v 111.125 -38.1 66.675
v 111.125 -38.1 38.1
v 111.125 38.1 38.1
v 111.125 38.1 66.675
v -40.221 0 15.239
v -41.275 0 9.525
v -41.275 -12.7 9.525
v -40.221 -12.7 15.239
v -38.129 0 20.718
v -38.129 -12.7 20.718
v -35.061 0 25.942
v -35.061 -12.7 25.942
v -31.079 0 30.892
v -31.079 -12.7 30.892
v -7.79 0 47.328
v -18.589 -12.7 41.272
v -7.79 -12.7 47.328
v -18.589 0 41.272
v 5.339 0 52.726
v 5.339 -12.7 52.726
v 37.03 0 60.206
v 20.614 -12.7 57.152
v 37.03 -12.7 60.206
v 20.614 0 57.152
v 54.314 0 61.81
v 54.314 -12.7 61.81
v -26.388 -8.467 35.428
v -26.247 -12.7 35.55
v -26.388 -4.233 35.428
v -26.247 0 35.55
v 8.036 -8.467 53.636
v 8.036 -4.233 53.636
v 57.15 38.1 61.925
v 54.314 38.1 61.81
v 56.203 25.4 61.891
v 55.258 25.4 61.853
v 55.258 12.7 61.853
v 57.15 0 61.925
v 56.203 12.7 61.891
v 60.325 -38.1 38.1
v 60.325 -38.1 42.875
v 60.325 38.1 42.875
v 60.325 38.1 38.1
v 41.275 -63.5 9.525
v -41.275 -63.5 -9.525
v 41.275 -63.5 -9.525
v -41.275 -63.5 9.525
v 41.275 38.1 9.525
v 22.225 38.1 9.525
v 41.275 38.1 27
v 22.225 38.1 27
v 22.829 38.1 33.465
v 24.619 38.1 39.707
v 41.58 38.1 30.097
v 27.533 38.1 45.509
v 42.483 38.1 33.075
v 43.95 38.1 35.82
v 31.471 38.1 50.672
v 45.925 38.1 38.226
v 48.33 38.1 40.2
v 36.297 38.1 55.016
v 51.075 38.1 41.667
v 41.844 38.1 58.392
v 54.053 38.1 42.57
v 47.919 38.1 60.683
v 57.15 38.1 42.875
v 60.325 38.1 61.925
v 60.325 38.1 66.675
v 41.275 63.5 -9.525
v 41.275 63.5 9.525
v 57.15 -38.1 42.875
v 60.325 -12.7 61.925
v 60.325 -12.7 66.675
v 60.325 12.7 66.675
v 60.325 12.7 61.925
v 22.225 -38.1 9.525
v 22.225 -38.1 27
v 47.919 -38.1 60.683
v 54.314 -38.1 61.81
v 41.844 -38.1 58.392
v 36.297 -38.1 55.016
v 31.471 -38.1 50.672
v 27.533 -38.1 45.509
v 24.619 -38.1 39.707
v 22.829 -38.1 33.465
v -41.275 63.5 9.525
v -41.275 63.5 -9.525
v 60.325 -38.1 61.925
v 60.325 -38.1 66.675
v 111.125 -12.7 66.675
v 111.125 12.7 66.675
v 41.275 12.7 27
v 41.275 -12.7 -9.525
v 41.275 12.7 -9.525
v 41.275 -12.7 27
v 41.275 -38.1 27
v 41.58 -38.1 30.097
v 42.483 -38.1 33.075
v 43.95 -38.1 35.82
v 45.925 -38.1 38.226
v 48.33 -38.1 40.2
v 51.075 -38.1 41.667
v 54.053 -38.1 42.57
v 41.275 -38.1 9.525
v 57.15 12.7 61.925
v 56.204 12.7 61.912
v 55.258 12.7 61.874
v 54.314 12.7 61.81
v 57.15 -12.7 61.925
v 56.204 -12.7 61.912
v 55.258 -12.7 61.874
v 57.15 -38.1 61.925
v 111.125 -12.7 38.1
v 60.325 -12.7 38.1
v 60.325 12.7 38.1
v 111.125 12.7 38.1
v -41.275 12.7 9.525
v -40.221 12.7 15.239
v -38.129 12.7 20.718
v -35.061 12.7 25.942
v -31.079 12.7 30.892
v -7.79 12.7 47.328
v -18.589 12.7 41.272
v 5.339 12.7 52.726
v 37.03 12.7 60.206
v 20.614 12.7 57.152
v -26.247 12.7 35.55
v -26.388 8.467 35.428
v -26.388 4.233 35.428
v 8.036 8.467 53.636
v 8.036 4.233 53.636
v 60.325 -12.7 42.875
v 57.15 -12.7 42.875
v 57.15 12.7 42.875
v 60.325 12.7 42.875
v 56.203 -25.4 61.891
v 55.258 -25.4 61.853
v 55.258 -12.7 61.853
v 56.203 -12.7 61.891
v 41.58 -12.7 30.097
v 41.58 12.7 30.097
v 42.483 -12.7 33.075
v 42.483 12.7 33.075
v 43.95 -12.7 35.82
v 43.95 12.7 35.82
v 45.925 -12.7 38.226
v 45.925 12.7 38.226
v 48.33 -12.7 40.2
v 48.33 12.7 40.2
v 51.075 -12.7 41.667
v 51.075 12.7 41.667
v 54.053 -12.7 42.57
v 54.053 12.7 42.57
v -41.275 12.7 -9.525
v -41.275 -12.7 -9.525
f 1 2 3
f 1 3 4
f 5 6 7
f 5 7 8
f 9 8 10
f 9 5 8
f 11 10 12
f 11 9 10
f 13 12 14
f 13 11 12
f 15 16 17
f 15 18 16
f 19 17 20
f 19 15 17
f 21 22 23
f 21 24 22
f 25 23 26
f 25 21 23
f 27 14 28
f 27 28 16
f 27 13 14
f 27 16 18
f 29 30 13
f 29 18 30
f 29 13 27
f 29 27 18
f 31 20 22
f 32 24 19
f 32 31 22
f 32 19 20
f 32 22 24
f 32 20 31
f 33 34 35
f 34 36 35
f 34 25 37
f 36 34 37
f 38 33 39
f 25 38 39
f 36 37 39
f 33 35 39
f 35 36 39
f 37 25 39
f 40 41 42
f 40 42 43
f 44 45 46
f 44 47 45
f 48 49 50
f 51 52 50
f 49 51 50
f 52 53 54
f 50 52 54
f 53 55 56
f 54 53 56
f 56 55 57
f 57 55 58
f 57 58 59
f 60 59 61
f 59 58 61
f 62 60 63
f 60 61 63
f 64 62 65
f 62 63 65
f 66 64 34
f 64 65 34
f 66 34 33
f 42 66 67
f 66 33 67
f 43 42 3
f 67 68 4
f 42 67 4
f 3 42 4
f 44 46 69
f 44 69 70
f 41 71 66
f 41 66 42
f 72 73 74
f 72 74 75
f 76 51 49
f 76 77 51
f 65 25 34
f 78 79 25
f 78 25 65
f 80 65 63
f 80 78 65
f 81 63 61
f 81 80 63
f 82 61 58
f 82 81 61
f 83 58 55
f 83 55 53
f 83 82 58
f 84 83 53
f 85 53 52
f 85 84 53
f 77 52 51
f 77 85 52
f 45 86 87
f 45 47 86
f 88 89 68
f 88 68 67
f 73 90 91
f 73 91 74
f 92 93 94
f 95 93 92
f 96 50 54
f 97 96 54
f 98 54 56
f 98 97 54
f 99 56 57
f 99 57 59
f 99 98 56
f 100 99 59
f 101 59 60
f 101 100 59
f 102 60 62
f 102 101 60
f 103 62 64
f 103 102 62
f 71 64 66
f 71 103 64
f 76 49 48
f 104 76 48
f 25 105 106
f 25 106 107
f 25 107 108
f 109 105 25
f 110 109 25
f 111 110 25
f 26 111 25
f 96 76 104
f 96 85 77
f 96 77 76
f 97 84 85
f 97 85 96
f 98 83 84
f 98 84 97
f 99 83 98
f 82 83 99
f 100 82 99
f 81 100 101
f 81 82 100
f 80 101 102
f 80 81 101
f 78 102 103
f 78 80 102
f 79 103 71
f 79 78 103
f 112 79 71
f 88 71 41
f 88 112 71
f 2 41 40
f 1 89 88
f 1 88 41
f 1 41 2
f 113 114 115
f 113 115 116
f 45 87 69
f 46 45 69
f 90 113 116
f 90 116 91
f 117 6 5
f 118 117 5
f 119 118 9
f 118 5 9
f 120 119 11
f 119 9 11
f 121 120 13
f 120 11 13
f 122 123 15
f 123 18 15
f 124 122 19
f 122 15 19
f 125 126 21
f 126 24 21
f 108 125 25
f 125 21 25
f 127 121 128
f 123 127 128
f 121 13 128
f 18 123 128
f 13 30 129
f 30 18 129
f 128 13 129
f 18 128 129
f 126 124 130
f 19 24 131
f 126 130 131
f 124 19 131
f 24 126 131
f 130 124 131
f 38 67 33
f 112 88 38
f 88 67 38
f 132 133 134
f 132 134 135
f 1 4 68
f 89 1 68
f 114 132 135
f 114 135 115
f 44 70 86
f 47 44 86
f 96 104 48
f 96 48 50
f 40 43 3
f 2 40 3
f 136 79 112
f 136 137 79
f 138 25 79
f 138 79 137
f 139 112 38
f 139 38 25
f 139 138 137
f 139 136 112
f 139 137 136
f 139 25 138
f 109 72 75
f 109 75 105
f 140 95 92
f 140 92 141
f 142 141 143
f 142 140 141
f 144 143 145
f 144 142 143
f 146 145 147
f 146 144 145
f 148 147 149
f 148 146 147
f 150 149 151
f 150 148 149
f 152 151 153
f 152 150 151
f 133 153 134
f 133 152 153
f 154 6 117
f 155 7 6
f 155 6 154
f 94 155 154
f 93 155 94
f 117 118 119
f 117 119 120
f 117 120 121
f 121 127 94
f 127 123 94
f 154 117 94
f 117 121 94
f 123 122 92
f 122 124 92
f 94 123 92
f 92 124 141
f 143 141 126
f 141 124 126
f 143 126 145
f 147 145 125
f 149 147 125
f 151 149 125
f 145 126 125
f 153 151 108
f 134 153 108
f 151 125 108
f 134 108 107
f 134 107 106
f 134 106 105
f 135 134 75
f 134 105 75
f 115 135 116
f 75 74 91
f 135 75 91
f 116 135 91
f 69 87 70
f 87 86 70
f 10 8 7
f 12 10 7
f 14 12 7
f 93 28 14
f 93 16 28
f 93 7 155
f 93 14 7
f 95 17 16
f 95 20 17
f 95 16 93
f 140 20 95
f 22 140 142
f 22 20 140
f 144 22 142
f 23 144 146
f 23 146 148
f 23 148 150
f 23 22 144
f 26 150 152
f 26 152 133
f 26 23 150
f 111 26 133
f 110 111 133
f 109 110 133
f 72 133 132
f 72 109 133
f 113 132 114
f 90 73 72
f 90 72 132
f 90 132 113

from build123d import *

# Parameters (mm, degrees)
F1_DEPTH = 38.1
F2_DEPTH = 63.5
F3_DEPTH = 12.7


with BuildPart() as f1:
    # F0 (on Front) → F1 (new body, symmetric)
    with BuildSketch(Plane.XZ):
        with BuildLine():
            Line((22.225, 9.525), (41.275, 9.525))
            Line((41.275, 9.525), (41.275, 27.0002))
            ThreePointArc((41.275, 27.0002), (45.92468, 38.22552), (57.15, 42.8752))
            Line((57.15, 42.8752), (60.325, 42.8752))
            Line((60.325, 42.8752), (60.325, 61.9252))
            Line((60.325, 61.9252), (57.15, 61.9252))
            add(Edge.make_bspline(
                [(54.314037, 61.809867), (55.257179, 61.855034), (56.202579, 61.893502), (57.15, 61.9252)],
                knots=[109.42562, 109.42562, 109.42562, 109.42562, 111.504536, 111.504536, 111.504536, 111.504536], degree=3))
            ThreePointArc((54.314037, 61.809867), (31.471199, 50.672015), (22.225, 27.0002))
            Line((22.225, 27.0002), (22.225, 9.525))
        make_face()
        Polygon((85.535526, 66.675), (85.567021, 61.9252), (85.725, 38.1), (111.125, 38.1), (111.125, 66.675), align=None)
        Polygon((60.325, 66.675), (60.325, 61.9252), (85.567021, 61.9252), (85.535526, 66.675), align=None)
        Polygon((60.325, 61.9252), (60.325, 42.8752), (60.325, 38.1), (85.725, 38.1), (85.567021, 61.9252), align=None)
    extrude(amount=F1_DEPTH, both=True)


with BuildPart() as f2:
    # F0 (on Front) → F2 (new body, symmetric)
    with BuildSketch(Plane.XZ):
        Polygon((-41.275, -9.525), (41.275, -9.525), (41.275, 9.525), (22.225, 9.525), (-41.275, 9.525), align=None)
    extrude(amount=F2_DEPTH, both=True)


with BuildPart() as f3:
    # F0 (on Front) → F3 (new body, symmetric)
    with BuildSketch(Plane.XZ):
        Polygon((-41.275, -9.525), (41.275, -9.525), (41.275, 9.525), (22.225, 9.525), (-41.275, 9.525), align=None)
        with BuildLine():
            Line((22.225, 9.525), (41.275, 9.525))
            Line((41.275, 9.525), (41.275, 27.0002))
            ThreePointArc((41.275, 27.0002), (45.92468, 38.22552), (57.15, 42.8752))
            Line((57.15, 42.8752), (60.325, 42.8752))
            Line((60.325, 42.8752), (60.325, 61.9252))
            Line((60.325, 61.9252), (57.15, 61.9252))
            add(Edge.make_bspline(
                [(54.314037, 61.809867), (55.257179, 61.855034), (56.202579, 61.893502), (57.15, 61.9252)],
                knots=[109.42562, 109.42562, 109.42562, 109.42562, 111.504536, 111.504536, 111.504536, 111.504536], degree=3))
            ThreePointArc((54.314037, 61.809867), (31.471199, 50.672015), (22.225, 27.0002))
            Line((22.225, 27.0002), (22.225, 9.525))
        make_face()
        with BuildLine():
            add(Edge.make_bspline(
                [(-41.275, 9.525), (-38.717687, 38.496606), (4.670877, 59.432472), (54.314037, 61.809867)],
                knots=[0, 0, 0, 0, 109.42562, 109.42562, 109.42562, 109.42562], degree=3))
            Line((-41.275, 9.525), (22.225, 9.525))
            Line((22.225, 9.525), (22.225, 27.0002))
            ThreePointArc((22.225, 27.0002), (31.471199, 50.672015), (54.314037, 61.809867))
        make_face()
        with BuildLine():
            ThreePointArc((57.15, 61.9252), (55.730846, 61.896355), (54.314037, 61.809867))
            add(Edge.make_bspline(
                [(54.314037, 61.809867), (55.257179, 61.855034), (56.202579, 61.893502), (57.15, 61.9252)],
                knots=[109.42562, 109.42562, 109.42562, 109.42562, 111.504536, 111.504536, 111.504536, 111.504536], degree=3))
        make_face()
        Polygon((60.325, 61.9252), (60.325, 42.8752), (60.325, 38.1), (85.725, 38.1), (85.567021, 61.9252), align=None)
        Polygon((60.325, 66.675), (60.325, 61.9252), (85.567021, 61.9252), (85.535526, 66.675), align=None)
        Polygon((85.535526, 66.675), (85.567021, 61.9252), (85.725, 38.1), (111.125, 38.1), (111.125, 66.675), align=None)
    extrude(amount=F3_DEPTH, both=True)


solid = Compound([f1.part, f2.part, f3.part])
